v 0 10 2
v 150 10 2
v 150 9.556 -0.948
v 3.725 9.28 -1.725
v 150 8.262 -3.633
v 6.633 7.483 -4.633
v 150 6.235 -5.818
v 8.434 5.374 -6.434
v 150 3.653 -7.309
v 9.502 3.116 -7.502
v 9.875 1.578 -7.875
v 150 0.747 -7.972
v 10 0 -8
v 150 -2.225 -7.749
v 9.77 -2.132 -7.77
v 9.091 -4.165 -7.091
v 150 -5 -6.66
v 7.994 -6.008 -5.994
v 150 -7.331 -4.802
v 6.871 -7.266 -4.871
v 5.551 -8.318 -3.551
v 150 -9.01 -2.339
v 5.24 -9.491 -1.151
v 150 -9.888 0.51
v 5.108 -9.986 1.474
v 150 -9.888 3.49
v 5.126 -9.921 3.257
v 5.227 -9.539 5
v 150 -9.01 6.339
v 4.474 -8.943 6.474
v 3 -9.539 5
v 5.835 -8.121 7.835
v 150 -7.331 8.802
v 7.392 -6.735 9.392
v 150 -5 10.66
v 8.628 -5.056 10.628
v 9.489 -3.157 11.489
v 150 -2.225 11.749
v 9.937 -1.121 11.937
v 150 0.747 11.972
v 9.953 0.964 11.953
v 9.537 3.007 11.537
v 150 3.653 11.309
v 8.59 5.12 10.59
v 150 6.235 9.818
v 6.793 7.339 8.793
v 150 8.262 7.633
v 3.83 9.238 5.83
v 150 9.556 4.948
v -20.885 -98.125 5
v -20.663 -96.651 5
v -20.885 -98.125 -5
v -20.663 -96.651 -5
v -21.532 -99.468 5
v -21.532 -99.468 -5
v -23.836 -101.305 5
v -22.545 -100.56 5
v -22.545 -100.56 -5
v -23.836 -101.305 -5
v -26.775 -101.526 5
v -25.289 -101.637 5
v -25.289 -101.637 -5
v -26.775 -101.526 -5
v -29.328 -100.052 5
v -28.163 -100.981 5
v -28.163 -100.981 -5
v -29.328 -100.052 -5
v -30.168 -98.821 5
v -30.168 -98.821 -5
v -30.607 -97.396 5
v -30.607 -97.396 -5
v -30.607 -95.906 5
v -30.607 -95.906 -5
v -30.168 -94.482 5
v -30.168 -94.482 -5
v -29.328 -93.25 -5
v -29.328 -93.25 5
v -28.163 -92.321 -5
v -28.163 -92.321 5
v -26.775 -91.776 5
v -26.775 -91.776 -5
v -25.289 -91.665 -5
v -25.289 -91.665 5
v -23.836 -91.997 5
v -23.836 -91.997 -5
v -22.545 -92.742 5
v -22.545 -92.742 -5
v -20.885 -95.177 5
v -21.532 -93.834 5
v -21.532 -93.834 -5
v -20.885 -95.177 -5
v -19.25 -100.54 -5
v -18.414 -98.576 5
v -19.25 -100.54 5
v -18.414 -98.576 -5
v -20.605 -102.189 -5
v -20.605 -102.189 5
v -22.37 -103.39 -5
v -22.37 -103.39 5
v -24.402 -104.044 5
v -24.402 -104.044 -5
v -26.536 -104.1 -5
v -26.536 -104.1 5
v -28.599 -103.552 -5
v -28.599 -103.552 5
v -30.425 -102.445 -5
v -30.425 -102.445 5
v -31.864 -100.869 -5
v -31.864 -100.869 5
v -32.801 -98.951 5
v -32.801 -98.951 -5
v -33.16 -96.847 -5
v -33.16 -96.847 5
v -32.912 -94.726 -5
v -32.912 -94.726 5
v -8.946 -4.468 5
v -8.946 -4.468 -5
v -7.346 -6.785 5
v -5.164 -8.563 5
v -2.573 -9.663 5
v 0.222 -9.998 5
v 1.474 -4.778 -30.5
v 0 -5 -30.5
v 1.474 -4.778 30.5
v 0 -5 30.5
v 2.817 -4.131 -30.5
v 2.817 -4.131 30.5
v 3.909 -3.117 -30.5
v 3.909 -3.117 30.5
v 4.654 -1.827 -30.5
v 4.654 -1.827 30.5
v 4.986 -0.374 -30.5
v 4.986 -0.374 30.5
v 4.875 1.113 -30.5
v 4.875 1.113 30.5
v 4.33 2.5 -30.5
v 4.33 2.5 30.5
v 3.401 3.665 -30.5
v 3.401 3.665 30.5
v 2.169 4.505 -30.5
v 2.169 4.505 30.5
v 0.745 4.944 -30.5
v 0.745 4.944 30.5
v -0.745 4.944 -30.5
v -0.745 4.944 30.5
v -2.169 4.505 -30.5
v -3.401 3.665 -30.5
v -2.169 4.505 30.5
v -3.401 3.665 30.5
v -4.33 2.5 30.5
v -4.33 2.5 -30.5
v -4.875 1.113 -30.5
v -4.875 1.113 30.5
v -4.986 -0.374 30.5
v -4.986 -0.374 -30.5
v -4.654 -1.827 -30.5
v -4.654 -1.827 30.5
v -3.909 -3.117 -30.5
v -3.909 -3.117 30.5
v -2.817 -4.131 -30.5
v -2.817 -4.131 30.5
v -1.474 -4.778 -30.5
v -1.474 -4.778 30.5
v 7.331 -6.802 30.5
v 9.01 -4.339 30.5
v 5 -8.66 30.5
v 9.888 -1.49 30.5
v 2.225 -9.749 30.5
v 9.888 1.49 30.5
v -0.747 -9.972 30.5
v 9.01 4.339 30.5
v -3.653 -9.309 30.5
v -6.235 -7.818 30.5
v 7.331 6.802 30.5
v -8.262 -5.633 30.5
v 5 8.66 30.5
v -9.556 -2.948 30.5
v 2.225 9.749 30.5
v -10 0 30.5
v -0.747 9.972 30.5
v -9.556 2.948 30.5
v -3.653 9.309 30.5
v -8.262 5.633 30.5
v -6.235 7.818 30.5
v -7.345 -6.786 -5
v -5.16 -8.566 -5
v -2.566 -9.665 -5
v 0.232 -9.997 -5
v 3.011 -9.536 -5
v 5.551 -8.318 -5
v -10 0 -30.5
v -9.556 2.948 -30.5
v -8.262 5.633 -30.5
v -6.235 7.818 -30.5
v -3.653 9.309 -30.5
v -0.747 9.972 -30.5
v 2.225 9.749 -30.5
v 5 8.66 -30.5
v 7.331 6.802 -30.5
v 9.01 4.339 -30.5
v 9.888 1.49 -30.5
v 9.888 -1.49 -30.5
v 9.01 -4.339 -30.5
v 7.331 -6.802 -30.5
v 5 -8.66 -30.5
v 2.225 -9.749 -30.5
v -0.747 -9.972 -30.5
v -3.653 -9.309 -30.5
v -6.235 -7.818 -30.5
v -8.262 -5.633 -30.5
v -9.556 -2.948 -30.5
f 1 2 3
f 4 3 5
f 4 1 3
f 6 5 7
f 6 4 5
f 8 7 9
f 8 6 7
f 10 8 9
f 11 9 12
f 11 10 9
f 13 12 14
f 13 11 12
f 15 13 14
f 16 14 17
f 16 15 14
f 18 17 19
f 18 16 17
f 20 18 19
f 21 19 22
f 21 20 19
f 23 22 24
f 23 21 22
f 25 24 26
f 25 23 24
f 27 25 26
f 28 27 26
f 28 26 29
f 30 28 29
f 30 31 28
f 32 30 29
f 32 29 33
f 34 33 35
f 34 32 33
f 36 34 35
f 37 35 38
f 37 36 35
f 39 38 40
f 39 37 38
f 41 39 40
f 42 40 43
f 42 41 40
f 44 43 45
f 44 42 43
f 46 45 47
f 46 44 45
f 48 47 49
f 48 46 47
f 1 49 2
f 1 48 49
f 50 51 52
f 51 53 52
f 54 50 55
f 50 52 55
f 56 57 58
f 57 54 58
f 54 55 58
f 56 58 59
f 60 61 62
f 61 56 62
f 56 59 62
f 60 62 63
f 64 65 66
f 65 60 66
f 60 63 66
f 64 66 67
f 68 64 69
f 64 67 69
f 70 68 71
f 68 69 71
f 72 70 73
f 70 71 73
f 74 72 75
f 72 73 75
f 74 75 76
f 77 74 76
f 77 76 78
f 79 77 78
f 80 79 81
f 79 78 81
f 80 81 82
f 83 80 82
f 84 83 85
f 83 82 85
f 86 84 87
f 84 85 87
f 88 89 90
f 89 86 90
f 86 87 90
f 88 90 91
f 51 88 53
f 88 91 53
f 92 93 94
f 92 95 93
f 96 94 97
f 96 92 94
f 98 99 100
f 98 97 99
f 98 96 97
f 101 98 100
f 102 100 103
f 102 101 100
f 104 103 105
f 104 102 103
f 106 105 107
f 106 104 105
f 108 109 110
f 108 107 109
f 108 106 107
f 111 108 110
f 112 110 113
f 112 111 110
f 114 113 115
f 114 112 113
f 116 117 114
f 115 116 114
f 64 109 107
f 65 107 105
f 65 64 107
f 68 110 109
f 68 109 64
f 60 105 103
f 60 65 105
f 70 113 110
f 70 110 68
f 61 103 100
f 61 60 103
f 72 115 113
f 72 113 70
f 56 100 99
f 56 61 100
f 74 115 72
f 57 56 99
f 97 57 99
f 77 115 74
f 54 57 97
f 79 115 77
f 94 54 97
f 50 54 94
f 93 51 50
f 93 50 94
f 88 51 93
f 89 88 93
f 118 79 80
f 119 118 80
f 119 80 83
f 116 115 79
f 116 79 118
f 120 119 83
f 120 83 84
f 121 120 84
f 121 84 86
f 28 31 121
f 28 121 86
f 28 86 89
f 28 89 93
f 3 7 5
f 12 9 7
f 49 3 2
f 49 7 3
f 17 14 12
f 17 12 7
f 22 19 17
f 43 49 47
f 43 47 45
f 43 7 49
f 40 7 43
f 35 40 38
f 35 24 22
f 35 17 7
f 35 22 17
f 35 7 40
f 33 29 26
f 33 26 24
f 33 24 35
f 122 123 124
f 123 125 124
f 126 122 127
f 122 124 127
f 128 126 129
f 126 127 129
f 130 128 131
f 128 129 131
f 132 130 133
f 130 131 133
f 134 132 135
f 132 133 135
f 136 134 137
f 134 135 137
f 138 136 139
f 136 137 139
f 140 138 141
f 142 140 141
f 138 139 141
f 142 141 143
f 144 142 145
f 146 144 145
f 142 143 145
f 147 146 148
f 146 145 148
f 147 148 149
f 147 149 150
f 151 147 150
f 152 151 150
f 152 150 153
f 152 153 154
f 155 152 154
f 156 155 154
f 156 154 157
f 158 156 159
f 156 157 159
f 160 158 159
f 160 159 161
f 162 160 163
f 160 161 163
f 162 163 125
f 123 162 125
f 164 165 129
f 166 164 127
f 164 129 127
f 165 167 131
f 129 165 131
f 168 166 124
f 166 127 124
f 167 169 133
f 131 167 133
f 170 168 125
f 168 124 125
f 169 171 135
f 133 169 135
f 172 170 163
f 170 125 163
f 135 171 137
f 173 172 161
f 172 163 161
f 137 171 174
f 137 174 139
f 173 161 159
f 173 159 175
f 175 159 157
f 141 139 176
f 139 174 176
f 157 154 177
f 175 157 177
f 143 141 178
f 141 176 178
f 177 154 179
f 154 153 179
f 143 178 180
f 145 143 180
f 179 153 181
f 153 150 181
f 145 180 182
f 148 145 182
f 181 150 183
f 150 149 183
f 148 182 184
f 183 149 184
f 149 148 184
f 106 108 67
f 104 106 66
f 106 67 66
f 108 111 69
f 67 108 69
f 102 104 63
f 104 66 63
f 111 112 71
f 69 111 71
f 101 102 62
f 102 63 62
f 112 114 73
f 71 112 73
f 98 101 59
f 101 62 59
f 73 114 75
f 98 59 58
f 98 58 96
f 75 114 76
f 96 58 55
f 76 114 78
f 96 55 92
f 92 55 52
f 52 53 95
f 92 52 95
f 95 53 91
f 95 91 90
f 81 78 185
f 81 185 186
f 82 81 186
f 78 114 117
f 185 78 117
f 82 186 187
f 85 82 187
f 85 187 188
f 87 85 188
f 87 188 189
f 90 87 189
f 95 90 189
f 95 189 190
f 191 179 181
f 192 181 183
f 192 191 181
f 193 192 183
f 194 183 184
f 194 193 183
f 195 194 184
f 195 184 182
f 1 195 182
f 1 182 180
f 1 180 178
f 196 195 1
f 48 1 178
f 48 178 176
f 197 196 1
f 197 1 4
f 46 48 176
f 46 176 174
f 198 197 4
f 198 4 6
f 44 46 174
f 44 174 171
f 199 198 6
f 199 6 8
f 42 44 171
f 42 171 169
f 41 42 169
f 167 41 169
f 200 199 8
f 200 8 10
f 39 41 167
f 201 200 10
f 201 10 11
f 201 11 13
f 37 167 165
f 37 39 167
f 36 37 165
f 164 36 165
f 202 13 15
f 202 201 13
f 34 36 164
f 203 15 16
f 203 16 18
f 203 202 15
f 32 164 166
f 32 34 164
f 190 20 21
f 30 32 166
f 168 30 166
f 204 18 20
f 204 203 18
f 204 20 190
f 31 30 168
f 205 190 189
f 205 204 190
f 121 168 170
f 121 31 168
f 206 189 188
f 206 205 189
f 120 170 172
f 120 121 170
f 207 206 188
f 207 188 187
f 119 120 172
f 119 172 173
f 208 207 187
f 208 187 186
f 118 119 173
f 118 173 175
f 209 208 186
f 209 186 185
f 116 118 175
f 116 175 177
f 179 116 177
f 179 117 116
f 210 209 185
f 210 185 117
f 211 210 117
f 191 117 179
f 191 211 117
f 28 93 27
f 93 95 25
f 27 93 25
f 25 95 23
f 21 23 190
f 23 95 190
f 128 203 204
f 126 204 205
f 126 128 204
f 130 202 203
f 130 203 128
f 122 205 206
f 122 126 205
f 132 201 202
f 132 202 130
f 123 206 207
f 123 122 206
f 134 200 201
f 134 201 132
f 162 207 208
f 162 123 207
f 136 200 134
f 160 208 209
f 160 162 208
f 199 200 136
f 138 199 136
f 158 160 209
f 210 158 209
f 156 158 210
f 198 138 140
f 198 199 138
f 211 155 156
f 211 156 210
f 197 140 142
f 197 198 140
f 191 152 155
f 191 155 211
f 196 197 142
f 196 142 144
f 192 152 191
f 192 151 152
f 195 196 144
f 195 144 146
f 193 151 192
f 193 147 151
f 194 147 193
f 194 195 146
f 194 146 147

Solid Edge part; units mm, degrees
sketch "Sketch1" plane through (0, 0, 0) normal (0, -1, 0) x (1, 0, 0)
  line L0 (-10, -30.5) -> (0, -30.5)
  line L1 (0, 30.5) -> (0, -30.5)
  line L2 (0, 30.5) -> (-10, 30.5)
  line L3 (-10, 30.5) -> (-10, -30.5)
revolve "RevolvedProtrusion1" add sketch "Sketch1" angle 360 about axis through (0, 0, 54) along (0, 0, -1)
sketch "Sketch2" plane through (0, 0, 0) normal (1, 0, 0) x (0, 1, 0)
  circle A0 centre (0, 2) radius 10
  dimension "D1" = 32.5
extrude "Protrusion1" add sketch "Sketch2" along normal blind 150
sketch "Sketch3" plane through (0, 0, 0) normal (0, 0, 1) x (1, 0, 0)
  circle A0 centre (-25.6627, -96.6511) radius 5
  line L0 (-8.9463, -4.4682) -> (-32.9115, -94.7264)
  arc A1 (-32.9115, -94.7264) -> (-18.4138, -98.5758) centre (-25.6627, -96.6511) ccw
  line L1 (-18.4138, -98.5758) -> (5.5514, -8.3176)
  arc A2 (5.5514, -8.3176) -> (-8.9463, -4.4682) centre (0, 0) cw
  dimension "D1" = 15
  dimension "D2" = 100
extrude "Styrarm" add sketch "Sketch3" along normal mid plane 10
hole "Hole1" at (0, 0, 30.5) direction (0, 0, -1) diameter 10 end up to next
